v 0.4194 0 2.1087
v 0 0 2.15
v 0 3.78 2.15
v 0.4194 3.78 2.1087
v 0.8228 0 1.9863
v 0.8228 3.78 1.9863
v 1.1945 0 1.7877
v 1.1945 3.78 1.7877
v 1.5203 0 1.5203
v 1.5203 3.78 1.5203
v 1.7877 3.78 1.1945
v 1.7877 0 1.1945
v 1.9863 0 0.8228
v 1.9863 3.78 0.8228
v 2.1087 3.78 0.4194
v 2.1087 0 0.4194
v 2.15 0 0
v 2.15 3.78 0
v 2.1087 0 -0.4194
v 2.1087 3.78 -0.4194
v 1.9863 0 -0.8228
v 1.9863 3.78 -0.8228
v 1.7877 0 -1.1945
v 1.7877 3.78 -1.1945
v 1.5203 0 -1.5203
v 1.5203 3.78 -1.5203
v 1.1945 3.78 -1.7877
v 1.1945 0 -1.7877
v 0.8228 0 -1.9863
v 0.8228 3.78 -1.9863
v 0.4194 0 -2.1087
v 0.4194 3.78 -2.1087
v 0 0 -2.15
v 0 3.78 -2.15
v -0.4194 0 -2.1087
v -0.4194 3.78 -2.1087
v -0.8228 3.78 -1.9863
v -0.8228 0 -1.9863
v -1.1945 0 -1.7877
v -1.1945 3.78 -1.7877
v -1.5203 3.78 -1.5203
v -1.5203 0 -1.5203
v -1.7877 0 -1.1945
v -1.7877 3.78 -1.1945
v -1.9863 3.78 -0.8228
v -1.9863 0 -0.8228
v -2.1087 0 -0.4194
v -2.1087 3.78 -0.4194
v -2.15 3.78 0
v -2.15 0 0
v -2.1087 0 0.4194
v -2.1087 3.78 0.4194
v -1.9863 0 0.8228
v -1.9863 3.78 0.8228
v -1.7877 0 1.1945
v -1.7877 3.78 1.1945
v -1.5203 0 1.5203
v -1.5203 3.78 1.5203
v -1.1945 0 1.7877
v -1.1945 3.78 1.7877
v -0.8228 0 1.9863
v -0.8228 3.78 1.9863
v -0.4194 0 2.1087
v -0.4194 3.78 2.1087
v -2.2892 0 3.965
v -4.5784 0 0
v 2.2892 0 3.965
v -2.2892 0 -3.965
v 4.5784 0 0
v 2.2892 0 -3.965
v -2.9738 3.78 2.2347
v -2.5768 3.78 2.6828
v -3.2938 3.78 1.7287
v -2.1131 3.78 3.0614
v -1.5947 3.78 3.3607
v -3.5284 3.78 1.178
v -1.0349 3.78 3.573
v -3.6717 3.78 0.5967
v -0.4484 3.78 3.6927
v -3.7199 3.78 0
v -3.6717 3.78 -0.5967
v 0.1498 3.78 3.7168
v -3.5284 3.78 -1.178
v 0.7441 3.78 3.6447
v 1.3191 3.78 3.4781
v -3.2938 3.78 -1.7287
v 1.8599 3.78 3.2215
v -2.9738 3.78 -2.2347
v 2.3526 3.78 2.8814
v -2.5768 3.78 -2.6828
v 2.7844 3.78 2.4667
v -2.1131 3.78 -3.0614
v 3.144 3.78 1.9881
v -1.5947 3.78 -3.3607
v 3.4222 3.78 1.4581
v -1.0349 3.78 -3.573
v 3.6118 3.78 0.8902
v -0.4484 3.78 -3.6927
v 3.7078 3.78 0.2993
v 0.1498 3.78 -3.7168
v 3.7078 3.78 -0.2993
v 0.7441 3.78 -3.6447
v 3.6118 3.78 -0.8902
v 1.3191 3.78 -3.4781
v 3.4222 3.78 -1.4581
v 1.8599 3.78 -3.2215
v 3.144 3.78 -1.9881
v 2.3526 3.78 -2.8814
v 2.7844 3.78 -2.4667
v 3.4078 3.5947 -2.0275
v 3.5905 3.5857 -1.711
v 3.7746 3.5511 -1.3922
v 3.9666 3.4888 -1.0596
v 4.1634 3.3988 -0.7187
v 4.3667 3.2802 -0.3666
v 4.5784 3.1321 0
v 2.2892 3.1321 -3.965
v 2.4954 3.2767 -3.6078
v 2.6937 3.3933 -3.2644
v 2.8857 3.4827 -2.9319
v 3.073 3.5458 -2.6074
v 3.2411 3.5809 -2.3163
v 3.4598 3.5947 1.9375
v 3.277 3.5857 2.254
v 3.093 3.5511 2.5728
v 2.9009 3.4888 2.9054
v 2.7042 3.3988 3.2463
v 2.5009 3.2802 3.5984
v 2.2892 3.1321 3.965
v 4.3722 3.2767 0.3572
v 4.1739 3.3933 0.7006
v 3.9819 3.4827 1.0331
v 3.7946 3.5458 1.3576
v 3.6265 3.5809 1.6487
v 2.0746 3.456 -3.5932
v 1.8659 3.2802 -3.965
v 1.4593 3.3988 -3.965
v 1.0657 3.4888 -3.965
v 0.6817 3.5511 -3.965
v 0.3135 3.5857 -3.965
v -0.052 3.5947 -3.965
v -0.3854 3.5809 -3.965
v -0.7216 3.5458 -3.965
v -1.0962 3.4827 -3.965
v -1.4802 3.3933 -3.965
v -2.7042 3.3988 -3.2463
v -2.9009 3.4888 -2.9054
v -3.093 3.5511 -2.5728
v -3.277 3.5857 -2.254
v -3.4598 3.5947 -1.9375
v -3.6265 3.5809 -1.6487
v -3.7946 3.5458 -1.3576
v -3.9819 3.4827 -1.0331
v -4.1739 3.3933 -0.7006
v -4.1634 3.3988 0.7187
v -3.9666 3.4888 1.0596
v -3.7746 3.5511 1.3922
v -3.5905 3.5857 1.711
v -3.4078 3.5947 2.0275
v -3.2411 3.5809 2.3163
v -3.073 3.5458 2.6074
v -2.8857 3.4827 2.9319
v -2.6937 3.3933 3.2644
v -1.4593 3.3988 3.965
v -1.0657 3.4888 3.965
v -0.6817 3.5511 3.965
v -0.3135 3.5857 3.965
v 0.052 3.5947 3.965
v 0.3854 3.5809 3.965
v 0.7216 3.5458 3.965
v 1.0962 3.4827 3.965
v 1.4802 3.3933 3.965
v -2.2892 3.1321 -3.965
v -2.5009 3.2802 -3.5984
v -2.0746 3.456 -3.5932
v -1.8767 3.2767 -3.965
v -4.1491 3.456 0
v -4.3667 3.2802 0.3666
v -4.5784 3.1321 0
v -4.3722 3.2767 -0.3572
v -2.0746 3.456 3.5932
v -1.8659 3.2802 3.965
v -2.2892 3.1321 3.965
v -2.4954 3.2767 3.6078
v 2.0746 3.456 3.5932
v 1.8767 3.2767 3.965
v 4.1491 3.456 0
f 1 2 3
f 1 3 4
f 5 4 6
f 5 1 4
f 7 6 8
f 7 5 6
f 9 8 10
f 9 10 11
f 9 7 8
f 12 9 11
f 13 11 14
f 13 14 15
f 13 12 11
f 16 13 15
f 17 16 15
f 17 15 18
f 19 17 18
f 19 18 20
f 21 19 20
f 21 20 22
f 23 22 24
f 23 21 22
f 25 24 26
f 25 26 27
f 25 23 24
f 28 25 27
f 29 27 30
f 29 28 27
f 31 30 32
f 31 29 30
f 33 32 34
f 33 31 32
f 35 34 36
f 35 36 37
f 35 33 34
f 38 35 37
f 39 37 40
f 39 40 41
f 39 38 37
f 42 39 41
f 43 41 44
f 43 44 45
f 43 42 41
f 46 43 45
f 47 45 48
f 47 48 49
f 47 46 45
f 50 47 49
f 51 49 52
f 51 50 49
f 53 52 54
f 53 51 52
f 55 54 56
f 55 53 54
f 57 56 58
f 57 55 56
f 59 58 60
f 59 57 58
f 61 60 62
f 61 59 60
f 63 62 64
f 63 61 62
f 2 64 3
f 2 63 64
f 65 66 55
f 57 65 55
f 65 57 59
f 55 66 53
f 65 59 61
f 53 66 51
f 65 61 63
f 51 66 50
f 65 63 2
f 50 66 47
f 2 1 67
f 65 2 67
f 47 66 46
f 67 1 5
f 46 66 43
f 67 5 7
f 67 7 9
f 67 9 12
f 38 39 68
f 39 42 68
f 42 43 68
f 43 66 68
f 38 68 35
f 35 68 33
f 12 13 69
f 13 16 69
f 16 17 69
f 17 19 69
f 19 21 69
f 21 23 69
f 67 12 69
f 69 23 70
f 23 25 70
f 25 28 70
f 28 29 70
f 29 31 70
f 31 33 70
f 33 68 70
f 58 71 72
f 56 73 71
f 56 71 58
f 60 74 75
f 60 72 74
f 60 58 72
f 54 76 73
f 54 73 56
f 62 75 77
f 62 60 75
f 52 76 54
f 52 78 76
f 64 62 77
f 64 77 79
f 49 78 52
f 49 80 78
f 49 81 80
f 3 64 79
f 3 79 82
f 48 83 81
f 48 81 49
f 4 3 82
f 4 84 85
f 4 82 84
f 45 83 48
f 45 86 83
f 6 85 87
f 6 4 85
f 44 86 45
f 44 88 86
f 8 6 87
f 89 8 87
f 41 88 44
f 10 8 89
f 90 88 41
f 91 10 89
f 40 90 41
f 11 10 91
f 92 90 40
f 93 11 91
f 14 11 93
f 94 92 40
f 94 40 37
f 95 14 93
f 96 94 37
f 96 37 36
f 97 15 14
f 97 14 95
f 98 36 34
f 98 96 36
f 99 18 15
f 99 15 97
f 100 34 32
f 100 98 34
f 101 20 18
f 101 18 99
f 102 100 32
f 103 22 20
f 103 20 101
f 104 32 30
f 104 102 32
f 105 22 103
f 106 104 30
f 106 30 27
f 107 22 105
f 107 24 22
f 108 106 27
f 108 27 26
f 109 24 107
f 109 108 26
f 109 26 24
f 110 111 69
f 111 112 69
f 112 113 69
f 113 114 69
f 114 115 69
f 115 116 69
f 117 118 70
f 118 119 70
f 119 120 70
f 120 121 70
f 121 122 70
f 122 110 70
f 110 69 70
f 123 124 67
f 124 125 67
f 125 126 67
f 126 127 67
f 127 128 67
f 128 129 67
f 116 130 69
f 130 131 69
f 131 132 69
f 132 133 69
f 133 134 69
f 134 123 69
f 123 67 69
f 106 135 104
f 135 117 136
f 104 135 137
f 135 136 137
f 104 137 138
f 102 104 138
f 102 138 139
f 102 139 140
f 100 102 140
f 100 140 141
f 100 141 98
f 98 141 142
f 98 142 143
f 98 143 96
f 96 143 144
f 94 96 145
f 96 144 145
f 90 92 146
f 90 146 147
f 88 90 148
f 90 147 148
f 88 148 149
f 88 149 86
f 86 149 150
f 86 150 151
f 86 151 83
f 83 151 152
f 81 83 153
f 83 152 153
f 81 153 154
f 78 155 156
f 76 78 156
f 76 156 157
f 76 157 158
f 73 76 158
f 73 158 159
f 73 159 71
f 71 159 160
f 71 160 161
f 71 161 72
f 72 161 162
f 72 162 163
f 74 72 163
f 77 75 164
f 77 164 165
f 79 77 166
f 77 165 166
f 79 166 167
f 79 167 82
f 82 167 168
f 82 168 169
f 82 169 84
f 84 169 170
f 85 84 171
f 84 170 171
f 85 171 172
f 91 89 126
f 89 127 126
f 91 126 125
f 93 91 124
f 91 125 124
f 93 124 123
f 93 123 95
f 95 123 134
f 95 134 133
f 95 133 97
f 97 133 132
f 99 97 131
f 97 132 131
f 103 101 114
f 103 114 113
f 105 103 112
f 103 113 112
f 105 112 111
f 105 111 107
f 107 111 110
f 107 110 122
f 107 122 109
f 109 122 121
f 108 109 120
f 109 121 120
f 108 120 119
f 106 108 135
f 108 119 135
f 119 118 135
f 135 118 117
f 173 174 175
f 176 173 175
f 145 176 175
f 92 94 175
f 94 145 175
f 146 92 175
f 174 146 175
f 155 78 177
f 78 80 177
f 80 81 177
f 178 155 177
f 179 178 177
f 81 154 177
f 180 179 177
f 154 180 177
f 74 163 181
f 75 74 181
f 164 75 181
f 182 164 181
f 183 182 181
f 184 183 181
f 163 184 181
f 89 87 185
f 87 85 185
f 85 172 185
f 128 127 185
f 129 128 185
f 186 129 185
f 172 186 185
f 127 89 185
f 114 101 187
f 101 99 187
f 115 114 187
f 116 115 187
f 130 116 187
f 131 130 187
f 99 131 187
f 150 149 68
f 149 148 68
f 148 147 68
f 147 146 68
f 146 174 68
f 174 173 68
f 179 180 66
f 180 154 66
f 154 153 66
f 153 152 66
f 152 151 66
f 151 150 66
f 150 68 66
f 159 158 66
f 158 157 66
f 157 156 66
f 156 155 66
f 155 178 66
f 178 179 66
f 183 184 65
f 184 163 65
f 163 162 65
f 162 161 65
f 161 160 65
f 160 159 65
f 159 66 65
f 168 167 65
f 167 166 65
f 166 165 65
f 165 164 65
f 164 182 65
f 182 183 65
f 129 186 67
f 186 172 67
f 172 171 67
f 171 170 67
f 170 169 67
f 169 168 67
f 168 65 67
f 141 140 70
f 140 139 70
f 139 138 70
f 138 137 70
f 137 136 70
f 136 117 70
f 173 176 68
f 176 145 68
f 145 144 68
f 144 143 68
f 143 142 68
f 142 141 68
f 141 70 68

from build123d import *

# Parameters (mm, degrees)
SKETCH1_R           = 2.15
BOSS_EXTRUDE1_DEPTH = 3.78


with BuildPart() as part:
    # Sketch1 → Boss-Extrude1 (new body)
    with BuildSketch(Plane(origin=(0, 0, 0), x_dir=(1, 0, 0), z_dir=(0, 1, 0))):
        Polygon((4.578387635, 0), (2.289193817, 3.965), (-2.289193817, 3.965), (-4.578387635, 0), (-2.289193817, -3.965), (2.289193817, -3.965), align=None)
        with Locations(Location((0, 0, 0), (0, 0, 270))):
            Circle(SKETCH1_R, mode=Mode.SUBTRACT)
    extrude(amount=BOSS_EXTRUDE1_DEPTH)

    # Sketch2 → Cut-Revolve1 (revolve, cut)
    with BuildSketch(Plane(origin=(0, 0, 0), x_dir=(0, 0, -1), z_dir=(1, 0, 0)), mode=Mode.PRIVATE) as cut_revolve1_sk:
        Polygon((3.008379415, 4.316956257), (7.760790511, 0.730297909), (8.861229965, 2.9800107), align=None)
    revolve(cut_revolve1_sk.sketch.rotate(Axis((0, 0, 0), (0, 1, 0)), 329.999999889), axis=Axis((0, 0, 0), (0, 1, 0)), mode=Mode.SUBTRACT)


solid = part.part
